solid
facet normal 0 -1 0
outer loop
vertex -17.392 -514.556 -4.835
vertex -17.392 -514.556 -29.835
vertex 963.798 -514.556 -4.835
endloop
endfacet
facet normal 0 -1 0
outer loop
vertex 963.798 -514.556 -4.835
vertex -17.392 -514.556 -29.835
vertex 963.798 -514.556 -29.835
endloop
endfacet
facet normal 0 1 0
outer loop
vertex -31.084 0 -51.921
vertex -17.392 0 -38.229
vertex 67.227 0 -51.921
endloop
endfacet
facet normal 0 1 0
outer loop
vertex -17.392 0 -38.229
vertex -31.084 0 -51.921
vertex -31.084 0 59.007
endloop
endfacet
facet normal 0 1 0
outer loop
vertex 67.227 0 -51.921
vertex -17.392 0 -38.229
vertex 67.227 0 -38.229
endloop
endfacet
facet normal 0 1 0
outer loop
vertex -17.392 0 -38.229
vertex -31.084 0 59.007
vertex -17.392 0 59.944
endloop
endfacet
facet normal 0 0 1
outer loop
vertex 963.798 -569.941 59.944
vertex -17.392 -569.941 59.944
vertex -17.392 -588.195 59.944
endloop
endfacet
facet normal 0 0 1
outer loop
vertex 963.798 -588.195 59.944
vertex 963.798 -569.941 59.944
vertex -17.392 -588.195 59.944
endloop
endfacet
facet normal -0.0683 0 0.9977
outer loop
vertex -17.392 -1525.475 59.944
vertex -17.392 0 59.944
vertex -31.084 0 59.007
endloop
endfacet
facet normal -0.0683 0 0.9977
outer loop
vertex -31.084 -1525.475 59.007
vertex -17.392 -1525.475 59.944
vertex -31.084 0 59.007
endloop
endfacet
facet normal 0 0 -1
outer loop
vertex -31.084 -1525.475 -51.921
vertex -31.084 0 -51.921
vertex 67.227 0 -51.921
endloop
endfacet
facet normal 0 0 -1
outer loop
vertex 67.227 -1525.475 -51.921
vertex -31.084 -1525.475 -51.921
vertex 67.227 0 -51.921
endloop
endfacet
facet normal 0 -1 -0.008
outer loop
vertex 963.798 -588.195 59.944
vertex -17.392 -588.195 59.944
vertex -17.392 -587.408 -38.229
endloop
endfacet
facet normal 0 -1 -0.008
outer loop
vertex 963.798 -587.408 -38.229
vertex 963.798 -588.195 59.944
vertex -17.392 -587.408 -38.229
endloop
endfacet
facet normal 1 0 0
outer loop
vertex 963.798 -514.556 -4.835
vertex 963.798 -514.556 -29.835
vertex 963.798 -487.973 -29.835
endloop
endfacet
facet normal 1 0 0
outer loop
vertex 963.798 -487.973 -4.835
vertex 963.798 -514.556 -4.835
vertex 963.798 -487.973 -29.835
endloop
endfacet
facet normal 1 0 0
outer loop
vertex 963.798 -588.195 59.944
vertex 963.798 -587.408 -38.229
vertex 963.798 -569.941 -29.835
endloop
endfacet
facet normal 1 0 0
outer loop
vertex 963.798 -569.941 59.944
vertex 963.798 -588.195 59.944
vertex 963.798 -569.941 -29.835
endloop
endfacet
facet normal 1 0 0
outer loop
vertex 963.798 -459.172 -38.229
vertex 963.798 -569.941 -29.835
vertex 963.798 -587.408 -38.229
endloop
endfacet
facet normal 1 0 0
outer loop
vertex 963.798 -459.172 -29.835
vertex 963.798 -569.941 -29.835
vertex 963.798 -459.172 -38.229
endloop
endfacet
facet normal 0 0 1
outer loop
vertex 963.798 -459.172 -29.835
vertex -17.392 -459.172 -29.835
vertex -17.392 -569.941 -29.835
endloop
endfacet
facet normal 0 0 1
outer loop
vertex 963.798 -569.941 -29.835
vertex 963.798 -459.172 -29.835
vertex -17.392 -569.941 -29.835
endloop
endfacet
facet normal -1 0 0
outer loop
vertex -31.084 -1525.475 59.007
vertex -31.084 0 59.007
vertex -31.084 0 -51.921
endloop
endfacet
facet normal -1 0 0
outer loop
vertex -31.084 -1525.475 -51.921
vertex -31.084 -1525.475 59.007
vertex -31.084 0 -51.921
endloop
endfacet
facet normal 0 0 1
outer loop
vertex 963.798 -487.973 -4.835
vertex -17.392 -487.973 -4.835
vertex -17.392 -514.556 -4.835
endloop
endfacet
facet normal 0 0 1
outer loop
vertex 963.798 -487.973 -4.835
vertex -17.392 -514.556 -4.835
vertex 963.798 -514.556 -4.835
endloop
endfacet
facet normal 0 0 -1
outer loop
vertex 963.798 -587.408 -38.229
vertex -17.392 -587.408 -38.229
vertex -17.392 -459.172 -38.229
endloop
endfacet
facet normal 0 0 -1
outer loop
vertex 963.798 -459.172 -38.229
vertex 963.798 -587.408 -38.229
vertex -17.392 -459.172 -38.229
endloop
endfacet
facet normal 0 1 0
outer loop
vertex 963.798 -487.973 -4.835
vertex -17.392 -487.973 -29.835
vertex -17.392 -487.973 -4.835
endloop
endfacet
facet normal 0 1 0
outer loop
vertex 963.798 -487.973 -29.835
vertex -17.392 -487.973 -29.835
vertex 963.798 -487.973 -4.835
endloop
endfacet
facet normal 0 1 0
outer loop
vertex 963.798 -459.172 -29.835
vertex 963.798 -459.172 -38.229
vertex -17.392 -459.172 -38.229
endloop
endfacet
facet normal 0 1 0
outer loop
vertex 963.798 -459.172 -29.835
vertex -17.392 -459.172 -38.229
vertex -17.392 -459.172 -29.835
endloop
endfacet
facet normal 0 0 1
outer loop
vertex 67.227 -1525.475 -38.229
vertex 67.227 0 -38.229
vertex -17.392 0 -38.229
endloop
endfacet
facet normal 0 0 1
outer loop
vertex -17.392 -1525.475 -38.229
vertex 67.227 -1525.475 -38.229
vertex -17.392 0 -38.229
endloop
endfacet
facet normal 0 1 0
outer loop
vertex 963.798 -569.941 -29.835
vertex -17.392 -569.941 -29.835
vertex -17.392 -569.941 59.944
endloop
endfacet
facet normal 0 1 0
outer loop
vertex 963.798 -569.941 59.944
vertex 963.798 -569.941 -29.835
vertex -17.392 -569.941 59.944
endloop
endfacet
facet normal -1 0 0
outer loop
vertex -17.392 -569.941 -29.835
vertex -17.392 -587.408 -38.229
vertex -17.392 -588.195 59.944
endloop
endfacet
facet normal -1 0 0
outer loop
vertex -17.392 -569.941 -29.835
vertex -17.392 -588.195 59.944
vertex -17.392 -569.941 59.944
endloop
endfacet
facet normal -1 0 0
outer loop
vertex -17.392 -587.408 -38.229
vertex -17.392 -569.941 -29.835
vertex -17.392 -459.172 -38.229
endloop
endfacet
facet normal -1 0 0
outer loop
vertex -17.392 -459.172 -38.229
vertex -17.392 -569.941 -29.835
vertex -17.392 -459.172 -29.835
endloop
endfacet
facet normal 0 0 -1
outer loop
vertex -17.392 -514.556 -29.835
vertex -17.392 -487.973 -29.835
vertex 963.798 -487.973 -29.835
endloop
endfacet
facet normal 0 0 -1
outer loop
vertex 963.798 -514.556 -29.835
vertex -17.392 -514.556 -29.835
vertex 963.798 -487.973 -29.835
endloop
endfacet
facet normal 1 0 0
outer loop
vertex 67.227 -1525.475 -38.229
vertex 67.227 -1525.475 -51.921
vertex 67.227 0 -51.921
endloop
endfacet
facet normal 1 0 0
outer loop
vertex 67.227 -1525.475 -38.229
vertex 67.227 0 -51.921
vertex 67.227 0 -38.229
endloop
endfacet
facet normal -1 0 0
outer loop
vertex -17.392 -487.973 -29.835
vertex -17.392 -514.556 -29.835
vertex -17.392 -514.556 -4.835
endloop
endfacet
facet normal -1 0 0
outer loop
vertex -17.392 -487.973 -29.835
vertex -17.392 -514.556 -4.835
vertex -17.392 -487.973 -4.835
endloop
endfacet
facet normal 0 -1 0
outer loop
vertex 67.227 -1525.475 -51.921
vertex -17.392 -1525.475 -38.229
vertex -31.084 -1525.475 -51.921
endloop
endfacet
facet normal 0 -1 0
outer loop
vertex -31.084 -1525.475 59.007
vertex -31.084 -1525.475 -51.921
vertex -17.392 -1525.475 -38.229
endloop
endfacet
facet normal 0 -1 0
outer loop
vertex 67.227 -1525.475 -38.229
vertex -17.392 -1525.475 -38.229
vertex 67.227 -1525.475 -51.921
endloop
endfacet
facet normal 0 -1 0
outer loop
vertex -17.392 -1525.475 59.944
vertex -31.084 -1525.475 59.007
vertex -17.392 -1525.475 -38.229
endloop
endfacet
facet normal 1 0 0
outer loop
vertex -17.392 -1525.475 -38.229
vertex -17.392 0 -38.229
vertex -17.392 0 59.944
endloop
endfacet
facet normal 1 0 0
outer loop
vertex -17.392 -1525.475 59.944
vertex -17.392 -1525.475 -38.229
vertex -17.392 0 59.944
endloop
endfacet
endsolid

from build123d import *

# Parameters (mm, degrees)
F1_DEPTH = 1525.475025
F3_DEPTH = 981.189966
F4_W     = 981.189966
F4_H     = 26.583612
F5_DEPTH = 25


with BuildPart() as f1:
    # F0 (on Front) → F1 (new body)
    with BuildSketch(Plane.XZ):
        Polygon((-17.392073, 59.94422), (-31.083677, 59.006798), (-31.083677, -51.920526), (67.22746, -51.920526), (67.22746, -38.228922), (-17.392073, -38.228922), align=None)
    extrude(amount=F1_DEPTH)


with BuildPart() as f3:
    # F2 (on face) → F3 (new body)
    with BuildSketch(Plane.YZ.offset(-17.392073)):
        Polygon((-569.941282, 59.94422), (-588.194728, 59.94422), (-587.408304, -38.228922), (-459.171593, -38.228922), (-459.171593, -29.834658), (-569.941282, -29.834658), align=None)
    extrude(amount=F3_DEPTH)


with BuildPart() as f5:
    # F4 (on face) → F5 (new body)
    with BuildSketch(Plane.XY.offset(-29.834658)):
        with Locations((473.20291, -501.264632)):
            Rectangle(F4_W, F4_H)
    extrude(amount=F5_DEPTH)


solid = Compound([f1.part, f3.part, f5.part])
